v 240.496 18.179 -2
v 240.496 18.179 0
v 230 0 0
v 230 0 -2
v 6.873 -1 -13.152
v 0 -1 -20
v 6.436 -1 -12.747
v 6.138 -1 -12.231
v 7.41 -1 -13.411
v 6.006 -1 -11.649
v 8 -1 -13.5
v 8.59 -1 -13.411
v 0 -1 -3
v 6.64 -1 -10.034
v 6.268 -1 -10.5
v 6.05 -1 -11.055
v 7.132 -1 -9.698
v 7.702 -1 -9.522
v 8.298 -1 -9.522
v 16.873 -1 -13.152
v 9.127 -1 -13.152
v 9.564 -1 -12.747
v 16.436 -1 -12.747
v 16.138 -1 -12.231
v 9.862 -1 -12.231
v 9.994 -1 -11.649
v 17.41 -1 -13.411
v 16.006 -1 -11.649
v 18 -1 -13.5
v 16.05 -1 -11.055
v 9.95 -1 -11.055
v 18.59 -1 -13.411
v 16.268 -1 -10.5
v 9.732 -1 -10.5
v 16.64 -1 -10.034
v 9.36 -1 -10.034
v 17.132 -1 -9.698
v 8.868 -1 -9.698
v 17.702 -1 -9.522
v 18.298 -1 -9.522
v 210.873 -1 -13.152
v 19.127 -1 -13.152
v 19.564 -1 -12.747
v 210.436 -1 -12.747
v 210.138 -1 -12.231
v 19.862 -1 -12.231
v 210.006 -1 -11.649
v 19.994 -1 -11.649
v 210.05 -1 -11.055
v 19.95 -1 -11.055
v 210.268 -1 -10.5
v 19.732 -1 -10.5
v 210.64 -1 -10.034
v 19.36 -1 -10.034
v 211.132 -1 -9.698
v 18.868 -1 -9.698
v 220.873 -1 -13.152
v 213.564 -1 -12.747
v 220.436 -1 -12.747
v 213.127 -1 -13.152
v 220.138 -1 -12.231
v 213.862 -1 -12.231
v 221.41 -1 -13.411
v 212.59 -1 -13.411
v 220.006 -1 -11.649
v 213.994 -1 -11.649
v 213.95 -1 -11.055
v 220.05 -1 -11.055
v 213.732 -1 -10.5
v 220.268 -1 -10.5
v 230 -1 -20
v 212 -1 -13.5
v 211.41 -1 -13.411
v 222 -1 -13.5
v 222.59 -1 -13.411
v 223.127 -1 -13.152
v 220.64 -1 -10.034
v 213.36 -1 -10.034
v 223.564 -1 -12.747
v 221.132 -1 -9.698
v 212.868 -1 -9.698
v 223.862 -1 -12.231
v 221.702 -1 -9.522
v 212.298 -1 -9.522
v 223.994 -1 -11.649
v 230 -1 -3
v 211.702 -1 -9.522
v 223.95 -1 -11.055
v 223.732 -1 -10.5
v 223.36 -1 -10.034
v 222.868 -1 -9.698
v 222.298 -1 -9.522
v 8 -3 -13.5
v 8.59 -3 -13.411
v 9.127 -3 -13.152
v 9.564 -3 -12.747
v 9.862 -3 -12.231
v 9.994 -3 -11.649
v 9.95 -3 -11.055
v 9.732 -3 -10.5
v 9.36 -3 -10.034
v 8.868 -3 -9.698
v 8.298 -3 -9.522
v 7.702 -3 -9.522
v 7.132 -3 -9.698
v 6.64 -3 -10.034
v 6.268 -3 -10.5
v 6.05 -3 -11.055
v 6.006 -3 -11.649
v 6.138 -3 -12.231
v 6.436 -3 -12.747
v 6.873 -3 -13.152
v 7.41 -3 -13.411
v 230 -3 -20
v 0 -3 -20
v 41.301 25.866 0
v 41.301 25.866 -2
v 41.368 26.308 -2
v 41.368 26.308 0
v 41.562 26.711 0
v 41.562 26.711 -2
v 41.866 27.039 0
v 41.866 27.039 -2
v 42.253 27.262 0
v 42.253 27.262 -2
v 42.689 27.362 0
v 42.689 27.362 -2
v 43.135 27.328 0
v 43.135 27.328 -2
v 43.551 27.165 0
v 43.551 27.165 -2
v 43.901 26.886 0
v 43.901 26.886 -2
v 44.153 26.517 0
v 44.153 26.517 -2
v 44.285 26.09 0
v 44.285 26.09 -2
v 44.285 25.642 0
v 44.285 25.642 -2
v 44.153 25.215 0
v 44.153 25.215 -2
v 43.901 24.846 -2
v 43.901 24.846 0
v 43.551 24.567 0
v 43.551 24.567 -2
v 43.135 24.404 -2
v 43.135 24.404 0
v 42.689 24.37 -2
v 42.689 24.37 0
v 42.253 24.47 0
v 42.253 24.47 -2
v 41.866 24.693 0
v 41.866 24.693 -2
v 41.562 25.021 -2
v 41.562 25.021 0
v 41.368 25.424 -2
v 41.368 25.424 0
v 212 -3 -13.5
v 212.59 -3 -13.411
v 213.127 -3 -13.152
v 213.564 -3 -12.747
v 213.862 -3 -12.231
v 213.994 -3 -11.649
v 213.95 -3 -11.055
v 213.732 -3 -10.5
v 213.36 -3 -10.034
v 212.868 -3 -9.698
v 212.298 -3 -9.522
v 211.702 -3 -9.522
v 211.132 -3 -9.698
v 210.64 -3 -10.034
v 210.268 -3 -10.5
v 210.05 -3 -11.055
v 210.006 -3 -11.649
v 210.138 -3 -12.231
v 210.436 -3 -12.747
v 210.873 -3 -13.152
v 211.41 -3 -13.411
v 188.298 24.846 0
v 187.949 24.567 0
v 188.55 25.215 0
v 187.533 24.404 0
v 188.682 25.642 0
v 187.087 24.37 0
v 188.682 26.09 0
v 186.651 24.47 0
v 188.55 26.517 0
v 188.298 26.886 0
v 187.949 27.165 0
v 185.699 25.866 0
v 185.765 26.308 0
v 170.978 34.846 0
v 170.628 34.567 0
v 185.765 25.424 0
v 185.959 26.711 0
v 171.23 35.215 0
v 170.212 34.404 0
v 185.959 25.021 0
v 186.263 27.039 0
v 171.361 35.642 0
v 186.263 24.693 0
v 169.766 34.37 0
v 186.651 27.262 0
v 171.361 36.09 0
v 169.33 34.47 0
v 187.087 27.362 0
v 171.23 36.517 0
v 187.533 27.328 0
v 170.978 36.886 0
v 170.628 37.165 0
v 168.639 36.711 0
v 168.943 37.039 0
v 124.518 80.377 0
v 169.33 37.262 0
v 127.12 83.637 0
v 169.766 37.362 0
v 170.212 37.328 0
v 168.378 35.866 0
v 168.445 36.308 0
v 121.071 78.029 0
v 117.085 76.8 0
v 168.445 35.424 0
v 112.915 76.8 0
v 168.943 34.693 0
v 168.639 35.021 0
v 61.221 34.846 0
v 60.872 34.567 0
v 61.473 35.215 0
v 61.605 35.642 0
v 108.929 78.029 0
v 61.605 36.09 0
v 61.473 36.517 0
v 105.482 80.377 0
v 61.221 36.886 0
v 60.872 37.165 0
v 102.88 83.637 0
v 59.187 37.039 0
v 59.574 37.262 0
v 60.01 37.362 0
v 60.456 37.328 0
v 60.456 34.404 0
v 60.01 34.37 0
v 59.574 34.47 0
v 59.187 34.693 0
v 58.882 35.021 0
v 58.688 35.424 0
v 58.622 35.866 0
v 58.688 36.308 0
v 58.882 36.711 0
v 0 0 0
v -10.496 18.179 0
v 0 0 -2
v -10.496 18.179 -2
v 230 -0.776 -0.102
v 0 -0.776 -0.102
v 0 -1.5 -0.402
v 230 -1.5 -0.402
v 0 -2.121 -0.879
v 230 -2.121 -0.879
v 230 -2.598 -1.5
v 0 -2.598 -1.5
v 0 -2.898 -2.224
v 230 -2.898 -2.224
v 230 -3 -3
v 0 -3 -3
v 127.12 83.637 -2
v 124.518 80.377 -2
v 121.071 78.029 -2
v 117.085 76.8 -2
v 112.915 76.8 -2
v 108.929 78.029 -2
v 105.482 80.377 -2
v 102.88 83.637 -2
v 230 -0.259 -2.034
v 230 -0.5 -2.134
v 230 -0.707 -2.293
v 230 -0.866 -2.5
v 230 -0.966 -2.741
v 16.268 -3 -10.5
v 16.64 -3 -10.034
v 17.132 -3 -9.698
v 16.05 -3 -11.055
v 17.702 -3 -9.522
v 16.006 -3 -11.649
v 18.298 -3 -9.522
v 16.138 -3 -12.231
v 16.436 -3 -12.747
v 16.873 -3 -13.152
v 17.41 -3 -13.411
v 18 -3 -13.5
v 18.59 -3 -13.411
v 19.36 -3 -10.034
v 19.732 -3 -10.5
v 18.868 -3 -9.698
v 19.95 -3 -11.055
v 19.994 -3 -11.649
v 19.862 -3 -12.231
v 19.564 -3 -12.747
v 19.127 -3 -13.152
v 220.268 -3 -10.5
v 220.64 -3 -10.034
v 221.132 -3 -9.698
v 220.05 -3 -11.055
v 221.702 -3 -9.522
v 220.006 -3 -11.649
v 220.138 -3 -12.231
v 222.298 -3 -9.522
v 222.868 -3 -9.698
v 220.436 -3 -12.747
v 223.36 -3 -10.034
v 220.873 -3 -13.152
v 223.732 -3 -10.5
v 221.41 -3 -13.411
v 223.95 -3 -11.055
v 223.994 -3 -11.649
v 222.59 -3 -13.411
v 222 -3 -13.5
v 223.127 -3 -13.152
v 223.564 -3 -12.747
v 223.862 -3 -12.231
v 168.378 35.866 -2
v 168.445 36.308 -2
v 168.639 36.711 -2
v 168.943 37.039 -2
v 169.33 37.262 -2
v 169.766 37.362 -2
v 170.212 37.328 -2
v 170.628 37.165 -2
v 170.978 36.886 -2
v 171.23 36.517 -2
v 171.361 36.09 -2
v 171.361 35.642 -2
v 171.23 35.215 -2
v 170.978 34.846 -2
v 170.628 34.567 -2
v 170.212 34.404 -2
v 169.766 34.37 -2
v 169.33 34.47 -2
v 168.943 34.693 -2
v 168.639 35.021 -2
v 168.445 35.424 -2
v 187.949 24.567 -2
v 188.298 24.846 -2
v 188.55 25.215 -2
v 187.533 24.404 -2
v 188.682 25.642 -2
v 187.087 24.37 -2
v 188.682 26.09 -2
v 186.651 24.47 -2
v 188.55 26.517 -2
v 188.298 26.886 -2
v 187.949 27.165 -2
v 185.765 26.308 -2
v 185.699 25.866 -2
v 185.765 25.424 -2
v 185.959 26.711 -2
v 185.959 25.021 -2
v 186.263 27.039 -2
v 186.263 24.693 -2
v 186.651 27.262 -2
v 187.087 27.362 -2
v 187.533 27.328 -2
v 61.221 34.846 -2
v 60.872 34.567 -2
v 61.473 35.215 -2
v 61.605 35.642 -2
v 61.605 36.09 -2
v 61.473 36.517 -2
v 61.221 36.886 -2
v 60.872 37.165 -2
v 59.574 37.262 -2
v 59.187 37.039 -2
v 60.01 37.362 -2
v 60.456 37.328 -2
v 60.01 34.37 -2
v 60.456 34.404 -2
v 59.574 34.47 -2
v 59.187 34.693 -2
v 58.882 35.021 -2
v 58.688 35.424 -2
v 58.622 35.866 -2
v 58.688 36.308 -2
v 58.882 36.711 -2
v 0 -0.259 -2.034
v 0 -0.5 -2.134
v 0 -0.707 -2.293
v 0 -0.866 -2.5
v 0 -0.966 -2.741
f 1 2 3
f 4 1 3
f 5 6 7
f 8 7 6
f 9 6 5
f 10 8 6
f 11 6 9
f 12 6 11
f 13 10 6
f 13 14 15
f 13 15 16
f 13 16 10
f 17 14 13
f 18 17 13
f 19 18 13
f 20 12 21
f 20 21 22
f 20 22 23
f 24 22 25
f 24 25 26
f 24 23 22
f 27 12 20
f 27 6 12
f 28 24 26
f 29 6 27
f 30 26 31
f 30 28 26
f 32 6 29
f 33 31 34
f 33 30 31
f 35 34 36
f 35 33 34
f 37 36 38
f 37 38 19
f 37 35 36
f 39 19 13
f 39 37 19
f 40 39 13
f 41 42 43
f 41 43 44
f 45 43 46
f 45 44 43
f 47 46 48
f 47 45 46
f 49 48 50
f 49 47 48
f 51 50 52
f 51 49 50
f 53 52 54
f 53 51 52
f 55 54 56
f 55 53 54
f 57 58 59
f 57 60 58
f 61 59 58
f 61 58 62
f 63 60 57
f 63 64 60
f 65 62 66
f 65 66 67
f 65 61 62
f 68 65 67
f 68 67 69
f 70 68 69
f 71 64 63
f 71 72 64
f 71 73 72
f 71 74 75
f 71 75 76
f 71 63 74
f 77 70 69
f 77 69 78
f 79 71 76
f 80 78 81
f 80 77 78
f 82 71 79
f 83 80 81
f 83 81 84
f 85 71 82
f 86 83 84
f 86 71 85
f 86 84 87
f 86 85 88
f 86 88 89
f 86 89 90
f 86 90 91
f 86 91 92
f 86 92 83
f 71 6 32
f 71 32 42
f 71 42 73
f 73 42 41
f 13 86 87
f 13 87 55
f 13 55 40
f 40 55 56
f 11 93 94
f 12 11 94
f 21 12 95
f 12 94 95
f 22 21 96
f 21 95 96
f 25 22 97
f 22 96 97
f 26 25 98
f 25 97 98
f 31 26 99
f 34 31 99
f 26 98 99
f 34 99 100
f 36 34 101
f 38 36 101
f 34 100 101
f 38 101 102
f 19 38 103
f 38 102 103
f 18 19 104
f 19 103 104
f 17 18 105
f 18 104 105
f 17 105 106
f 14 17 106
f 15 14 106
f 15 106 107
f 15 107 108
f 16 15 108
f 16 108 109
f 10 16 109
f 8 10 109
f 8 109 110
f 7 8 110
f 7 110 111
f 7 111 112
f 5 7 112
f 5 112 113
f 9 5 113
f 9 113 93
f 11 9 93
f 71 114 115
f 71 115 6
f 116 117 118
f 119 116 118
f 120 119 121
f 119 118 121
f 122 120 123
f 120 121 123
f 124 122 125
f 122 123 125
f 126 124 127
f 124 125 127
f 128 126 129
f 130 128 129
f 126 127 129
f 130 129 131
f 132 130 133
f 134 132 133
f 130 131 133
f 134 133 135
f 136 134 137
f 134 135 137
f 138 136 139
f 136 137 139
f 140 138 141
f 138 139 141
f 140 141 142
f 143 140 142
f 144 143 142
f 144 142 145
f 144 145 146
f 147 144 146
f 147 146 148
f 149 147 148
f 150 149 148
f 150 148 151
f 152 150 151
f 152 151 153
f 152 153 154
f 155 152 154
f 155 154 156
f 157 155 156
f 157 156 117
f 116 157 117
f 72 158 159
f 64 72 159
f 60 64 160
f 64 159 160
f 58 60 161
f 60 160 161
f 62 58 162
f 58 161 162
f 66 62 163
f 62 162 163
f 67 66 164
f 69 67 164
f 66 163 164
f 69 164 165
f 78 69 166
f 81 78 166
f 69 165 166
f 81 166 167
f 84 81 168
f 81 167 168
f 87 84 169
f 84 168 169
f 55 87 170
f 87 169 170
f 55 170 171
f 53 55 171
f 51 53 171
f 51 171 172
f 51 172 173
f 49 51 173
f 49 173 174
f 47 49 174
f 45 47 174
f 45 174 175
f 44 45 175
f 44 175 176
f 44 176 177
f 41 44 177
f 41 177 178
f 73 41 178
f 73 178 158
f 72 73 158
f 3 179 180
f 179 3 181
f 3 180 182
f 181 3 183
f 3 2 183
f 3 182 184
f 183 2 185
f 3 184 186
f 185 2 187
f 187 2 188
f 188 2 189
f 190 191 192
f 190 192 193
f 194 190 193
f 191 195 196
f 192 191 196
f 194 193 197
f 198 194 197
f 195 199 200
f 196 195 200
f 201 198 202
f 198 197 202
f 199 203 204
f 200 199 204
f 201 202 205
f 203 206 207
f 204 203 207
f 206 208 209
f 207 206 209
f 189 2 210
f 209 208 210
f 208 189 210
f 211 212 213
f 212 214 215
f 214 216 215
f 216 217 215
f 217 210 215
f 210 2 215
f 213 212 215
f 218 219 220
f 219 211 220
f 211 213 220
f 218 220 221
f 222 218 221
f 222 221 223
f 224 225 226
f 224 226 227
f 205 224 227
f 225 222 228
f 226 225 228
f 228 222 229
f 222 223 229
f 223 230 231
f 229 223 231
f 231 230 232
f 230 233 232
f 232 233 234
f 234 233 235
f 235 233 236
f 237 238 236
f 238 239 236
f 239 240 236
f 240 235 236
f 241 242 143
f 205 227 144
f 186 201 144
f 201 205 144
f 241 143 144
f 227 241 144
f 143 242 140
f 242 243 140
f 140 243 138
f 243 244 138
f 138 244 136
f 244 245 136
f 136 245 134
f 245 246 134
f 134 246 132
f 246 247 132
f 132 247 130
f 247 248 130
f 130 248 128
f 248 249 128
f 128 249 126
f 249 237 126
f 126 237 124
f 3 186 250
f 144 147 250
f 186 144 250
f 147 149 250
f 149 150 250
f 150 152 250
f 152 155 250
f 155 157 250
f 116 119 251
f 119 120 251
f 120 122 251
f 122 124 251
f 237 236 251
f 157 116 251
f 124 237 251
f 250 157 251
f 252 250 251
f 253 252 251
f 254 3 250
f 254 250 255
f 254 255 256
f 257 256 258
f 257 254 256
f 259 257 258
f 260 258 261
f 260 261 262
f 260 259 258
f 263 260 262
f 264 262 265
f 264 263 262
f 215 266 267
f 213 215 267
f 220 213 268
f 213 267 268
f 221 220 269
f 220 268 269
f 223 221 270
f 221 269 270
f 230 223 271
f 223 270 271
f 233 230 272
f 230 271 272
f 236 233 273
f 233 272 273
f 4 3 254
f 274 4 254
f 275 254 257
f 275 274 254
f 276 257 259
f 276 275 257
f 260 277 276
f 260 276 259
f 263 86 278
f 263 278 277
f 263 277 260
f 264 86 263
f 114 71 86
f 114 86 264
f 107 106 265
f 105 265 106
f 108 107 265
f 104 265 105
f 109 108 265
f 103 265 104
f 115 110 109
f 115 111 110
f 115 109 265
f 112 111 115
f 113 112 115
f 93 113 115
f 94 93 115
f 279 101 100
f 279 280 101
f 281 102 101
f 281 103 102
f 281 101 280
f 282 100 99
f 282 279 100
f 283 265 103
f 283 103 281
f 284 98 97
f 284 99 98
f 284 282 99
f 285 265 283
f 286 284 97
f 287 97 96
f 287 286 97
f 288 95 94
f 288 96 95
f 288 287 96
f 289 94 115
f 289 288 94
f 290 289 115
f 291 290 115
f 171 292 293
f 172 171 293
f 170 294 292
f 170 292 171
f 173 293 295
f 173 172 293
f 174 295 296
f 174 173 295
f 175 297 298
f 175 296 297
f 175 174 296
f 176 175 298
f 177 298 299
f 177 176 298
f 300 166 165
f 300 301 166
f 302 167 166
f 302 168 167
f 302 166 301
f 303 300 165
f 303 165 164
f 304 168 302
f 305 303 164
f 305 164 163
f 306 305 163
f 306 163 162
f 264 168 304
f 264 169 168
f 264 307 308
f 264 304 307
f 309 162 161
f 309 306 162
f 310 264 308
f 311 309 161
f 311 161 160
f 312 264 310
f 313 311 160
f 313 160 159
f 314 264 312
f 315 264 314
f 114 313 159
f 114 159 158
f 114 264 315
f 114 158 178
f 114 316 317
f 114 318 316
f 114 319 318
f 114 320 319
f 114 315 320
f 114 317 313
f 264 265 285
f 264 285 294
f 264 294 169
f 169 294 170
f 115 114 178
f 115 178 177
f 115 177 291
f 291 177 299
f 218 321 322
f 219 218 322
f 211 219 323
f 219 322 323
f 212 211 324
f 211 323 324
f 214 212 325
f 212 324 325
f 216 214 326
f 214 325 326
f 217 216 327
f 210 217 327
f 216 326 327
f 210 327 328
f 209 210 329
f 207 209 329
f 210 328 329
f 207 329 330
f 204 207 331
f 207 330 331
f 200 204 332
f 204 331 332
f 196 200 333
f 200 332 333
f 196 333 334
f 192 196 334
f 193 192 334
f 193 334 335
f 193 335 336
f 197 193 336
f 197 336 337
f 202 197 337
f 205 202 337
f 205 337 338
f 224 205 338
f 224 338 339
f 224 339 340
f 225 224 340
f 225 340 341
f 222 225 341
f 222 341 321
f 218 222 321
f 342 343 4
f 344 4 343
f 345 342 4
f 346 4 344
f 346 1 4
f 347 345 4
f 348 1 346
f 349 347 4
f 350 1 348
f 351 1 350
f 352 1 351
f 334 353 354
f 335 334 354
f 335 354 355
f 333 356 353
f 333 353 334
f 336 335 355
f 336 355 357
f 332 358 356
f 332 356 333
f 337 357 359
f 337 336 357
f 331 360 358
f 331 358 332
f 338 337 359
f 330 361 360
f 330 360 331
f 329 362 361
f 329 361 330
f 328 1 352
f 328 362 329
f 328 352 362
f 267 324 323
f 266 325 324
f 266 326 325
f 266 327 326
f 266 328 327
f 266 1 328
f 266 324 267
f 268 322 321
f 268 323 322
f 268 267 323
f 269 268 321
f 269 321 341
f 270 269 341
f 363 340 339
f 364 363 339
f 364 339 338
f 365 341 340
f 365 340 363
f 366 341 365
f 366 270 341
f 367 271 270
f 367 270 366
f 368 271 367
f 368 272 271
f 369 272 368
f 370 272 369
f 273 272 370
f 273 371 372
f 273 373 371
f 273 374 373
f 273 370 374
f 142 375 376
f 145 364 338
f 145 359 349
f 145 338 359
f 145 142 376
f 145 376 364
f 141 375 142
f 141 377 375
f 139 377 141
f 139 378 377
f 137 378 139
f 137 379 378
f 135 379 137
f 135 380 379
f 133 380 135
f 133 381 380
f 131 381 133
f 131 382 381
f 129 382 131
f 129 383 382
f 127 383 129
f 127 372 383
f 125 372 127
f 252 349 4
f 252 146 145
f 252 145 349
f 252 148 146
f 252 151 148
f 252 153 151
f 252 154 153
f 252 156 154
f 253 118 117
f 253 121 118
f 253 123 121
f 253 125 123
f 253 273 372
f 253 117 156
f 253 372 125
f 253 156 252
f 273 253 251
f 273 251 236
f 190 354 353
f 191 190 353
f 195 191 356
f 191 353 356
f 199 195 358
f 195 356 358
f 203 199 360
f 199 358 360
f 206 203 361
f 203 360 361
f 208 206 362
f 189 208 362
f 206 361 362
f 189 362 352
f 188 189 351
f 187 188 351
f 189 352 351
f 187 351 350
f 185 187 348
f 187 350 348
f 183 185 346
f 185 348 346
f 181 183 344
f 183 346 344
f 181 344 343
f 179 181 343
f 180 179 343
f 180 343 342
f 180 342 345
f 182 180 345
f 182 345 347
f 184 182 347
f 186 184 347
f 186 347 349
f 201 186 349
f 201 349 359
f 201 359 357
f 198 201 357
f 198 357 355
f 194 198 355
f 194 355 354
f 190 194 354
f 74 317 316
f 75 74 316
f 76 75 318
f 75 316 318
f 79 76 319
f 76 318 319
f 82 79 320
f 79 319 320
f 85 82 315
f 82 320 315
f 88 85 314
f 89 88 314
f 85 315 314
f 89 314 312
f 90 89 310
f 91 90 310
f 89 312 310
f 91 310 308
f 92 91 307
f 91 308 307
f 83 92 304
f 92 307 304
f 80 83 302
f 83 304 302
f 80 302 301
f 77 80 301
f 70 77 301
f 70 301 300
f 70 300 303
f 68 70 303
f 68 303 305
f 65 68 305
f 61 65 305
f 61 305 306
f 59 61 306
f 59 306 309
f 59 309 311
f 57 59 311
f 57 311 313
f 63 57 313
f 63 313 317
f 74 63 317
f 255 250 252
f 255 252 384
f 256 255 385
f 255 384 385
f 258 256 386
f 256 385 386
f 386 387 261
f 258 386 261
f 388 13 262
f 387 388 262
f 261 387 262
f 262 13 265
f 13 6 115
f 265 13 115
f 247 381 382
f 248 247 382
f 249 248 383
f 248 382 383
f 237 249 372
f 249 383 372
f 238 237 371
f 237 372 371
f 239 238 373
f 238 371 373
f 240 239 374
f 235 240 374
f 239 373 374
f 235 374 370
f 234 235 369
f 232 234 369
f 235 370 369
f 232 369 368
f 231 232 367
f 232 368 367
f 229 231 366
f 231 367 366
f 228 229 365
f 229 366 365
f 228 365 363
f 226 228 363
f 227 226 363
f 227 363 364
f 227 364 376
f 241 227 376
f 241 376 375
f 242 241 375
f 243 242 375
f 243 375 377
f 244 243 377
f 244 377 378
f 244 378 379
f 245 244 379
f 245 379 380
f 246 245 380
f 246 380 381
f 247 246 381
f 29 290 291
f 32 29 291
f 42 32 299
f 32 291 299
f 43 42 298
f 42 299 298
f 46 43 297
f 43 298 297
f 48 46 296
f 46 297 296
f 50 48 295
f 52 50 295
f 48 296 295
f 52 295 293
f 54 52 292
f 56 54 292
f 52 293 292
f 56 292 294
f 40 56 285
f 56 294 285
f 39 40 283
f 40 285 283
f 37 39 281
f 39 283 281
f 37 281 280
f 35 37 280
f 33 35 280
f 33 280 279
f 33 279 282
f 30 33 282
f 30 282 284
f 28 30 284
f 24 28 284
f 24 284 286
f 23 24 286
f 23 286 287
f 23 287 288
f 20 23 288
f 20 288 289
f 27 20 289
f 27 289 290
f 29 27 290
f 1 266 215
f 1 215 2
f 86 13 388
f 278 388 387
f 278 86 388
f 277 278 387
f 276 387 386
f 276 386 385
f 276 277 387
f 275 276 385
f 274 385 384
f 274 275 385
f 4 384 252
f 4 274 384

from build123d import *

# Parameters (mm, degrees)
SKETCH_10_R                   = 10
SM_BASE_FLANGE_3_DEPTH        = 2
SM_EDGE_FLANGE_6_DEPTH        = 230
SM_EDGE_FLANGE_6_BEND_DEPTH   = 230
SM_EDGE_FLANGE_6_BEND_2_DEPTH = 230
CUT_EXTRUDE_4_REACH           = 363.137
SKETCH_47_R                   = 2
CUT_EXTRUDE_6_REACH           = 263.424
SKETCH_50_R                   = 2
CUT_EXTRUDE_7_REACH           = 351.772
SKETCH_51_R                   = 2
CUT_EXTRUDE_8_REACH           = 349.61
SKETCH_52_R                   = 14
SKETCH_53_R                   = 1.5
CUT_EXTRUDE_9_DEPTH           = 10
OTHER_START                   = -20
OTHER_1_OUTLINE_R             = 1.5
OTHER_1_OUTLINE_R_2           = 10
OTHER_1_DEPTH                 = 20


# Read off the part's stored shape, not the designer's step: Полость1
# Sheet-metal steps are written as plain solids
with BuildPart() as part:
    # Эскиз10 → Базовая кромка3 (new body)
    with BuildSketch(Plane.XY):
        Polygon((0, 0), (-21, 36.373066959), (94, 235.558909829), (136, 235.558909829), (251, 36.373066959), (230, 0), align=None)
        with Locations((171.849364905, 123.465988394)):
            Circle(SKETCH_10_R, mode=Mode.SUBTRACT)
    extrude(amount=-SM_BASE_FLANGE_3_DEPTH)

    # Ребро-кромка6 section (across the edge) → Ребро-кромка6 (add)
    with BuildSketch(Plane(origin=(-21.866025404, 36.873066959, -2), x_dir=(0.8660254037844436, -0.4999999999999914, -3.4914813388431334e-15), z_dir=(0.4999999999999914, 0.8660254037844436, 0))):
        with BuildLine():
            Line((-2, 1), (-2, 18))
            Line((-2, 18), (0, 18))
            Line((0, 18), (0, 1))
            ThreePointArc((0, 1), (0.292893219, 0.292893219), (1, 0))
            Line((1, 0), (1, -2))
            ThreePointArc((1, -2), (-1.121320344, -1.121320344), (-2, 1))
        make_face()
    extrude(amount=SM_EDGE_FLANGE_6_DEPTH)

    # Ребро-кромка6 section 2 (across the edge) → Ребро-кромка6 bend (add)
    with BuildSketch(Plane(origin=(136.866025404, 236.058909829, -2), x_dir=(-0.8660254037844363, -0.5000000000000041, -3.4914813388431334e-15), z_dir=(0.5000000000000041, -0.8660254037844363, 0))):
        with BuildLine():
            Line((-2, 1), (-2, 18))
            Line((-2, 18), (0, 18))
            Line((0, 18), (0, 1))
            ThreePointArc((0, 1), (0.292893219, 0.292893219), (1, 0))
            Line((1, 0), (1, -2))
            ThreePointArc((1, -2), (-1.121320344, -1.121320344), (-2, 1))
        make_face()
    extrude(amount=SM_EDGE_FLANGE_6_BEND_DEPTH)

    # Ребро-кромка6 section 3 (across the edge) → Ребро-кромка6 bend 2 (add)
    with BuildSketch(Plane(origin=(230, -1, -2), x_dir=(0, 1, 0), z_dir=(-1, 0, 0))):
        with BuildLine():
            Line((-2, 1), (-2, 18))
            Line((-2, 18), (0, 18))
            Line((0, 18), (0, 1))
            ThreePointArc((0, 1), (0.292893219, 0.292893219), (1, 0))
            Line((1, 0), (1, -2))
            ThreePointArc((1, -2), (-1.121320344, -1.121320344), (-2, 1))
        make_face()
    extrude(amount=SM_EDGE_FLANGE_6_BEND_2_DEPTH)

    # Эскиз47 → Вырез-Вытянуть4 (cut, up to next)
    with BuildSketch(Plane(origin=(-34.098076211, 19.686533479, 0), x_dir=(0, 0, 1), z_dir=(-0.866025403784443, 0.4999999999999925, 3.788649256556814e-15)), mode=Mode.PRIVATE) as cut_extrude_4_sk1:
        with Locations(Location((-11.5, 29, 0), (0, 0, 270))):
            Circle(SKETCH_47_R)
    cut_extrude_4_tool1 = extrude(cut_extrude_4_sk1.sketch, amount=-CUT_EXTRUDE_4_REACH, mode=Mode.PRIVATE) & part.part
    # Эскиз47 → Вырез-Вытянуть4 (cut, up to next)
    with BuildSketch(Plane(origin=(-34.098076211, 19.686533479, 0), x_dir=(0, 0, 1), z_dir=(-0.866025403784443, 0.4999999999999925, 3.788649256556814e-15)), mode=Mode.PRIVATE) as cut_extrude_4_sk2:
        with Locations(Location((-11.5, 39, 0), (0, 0, 270))):
            Circle(SKETCH_47_R)
    cut_extrude_4_tool2 = extrude(cut_extrude_4_sk2.sketch, amount=-CUT_EXTRUDE_4_REACH, mode=Mode.PRIVATE) & part.part
    # Эскиз47 → Вырез-Вытянуть4 (cut, up to next)
    with BuildSketch(Plane(origin=(-34.098076211, 19.686533479, 0), x_dir=(0, 0, 1), z_dir=(-0.866025403784443, 0.4999999999999925, 3.788649256556814e-15)), mode=Mode.PRIVATE) as cut_extrude_4_sk3:
        with Locations(Location((-11.5, 233, 0), (0, 0, 270))):
            Circle(SKETCH_47_R)
    cut_extrude_4_tool3 = extrude(cut_extrude_4_sk3.sketch, amount=-CUT_EXTRUDE_4_REACH, mode=Mode.PRIVATE) & part.part
    # Эскиз47 → Вырез-Вытянуть4 (cut, up to next)
    with BuildSketch(Plane(origin=(-34.098076211, 19.686533479, 0), x_dir=(0, 0, 1), z_dir=(-0.866025403784443, 0.4999999999999925, 3.788649256556814e-15)), mode=Mode.PRIVATE) as cut_extrude_4_sk4:
        with Locations(Location((-11.5, 243, 0), (0, 0, 270))):
            Circle(SKETCH_47_R)
    cut_extrude_4_tool4 = extrude(cut_extrude_4_sk4.sketch, amount=-CUT_EXTRUDE_4_REACH, mode=Mode.PRIVATE) & part.part
    add(cut_extrude_4_tool1.solids().sort_by_distance((-19.598076, 44.80127, -11.5))[0], mode=Mode.SUBTRACT)
    add(cut_extrude_4_tool2.solids().sort_by_distance((-14.598076, 53.461524, -11.5))[0], mode=Mode.SUBTRACT)
    add(cut_extrude_4_tool3.solids().sort_by_distance((82.401924, 221.470453, -11.5))[0], mode=Mode.SUBTRACT)
    add(cut_extrude_4_tool4.solids().sort_by_distance((87.401924, 230.130707, -11.5))[0], mode=Mode.SUBTRACT)

    # Эскиз50 → Вырез-Вытянуть6 (cut, up to next)
    with BuildSketch(Plane(origin=(206.598076211, 119.279454915, 0), x_dir=(0, 0, -1), z_dir=(0.866025403784436, 0.5000000000000047, 3.0623287353932815e-15)), mode=Mode.PRIVATE) as cut_extrude_6_sk1:
        with Locations(Location((11.5, -86, 0), (0, 0, 90))):
            Circle(SKETCH_50_R)
    cut_extrude_6_tool1 = extrude(cut_extrude_6_sk1.sketch, amount=-CUT_EXTRUDE_6_REACH, mode=Mode.PRIVATE) & part.part
    # Эскиз50 → Вырез-Вытянуть6 (cut, up to next)
    with BuildSketch(Plane(origin=(206.598076211, 119.279454915, 0), x_dir=(0, 0, -1), z_dir=(0.866025403784436, 0.5000000000000047, 3.0623287353932815e-15)), mode=Mode.PRIVATE) as cut_extrude_6_sk2:
        with Locations(Location((11.5, -76, 0), (0, 0, 90))):
            Circle(SKETCH_50_R)
    cut_extrude_6_tool2 = extrude(cut_extrude_6_sk2.sketch, amount=-CUT_EXTRUDE_6_REACH, mode=Mode.PRIVATE) & part.part
    # Эскиз50 → Вырез-Вытянуть6 (cut, up to next)
    with BuildSketch(Plane(origin=(206.598076211, 119.279454915, 0), x_dir=(0, 0, -1), z_dir=(0.866025403784436, 0.5000000000000047, 3.0623287353932815e-15)), mode=Mode.PRIVATE) as cut_extrude_6_sk3:
        with Locations(Location((11.5, 118, 0), (0, 0, 90))):
            Circle(SKETCH_50_R)
    cut_extrude_6_tool3 = extrude(cut_extrude_6_sk3.sketch, amount=-CUT_EXTRUDE_6_REACH, mode=Mode.PRIVATE) & part.part
    # Эскиз50 → Вырез-Вытянуть6 (cut, up to next)
    with BuildSketch(Plane(origin=(206.598076211, 119.279454915, 0), x_dir=(0, 0, -1), z_dir=(0.866025403784436, 0.5000000000000047, 3.0623287353932815e-15)), mode=Mode.PRIVATE) as cut_extrude_6_sk4:
        with Locations(Location((11.5, 128, 0), (0, 0, 90))):
            Circle(SKETCH_50_R)
    cut_extrude_6_tool4 = extrude(cut_extrude_6_sk4.sketch, amount=-CUT_EXTRUDE_6_REACH, mode=Mode.PRIVATE) & part.part
    add(cut_extrude_6_tool1.solids().sort_by_distance((249.598076, 44.80127, -11.5))[0], mode=Mode.SUBTRACT)
    add(cut_extrude_6_tool2.solids().sort_by_distance((244.598076, 53.461524, -11.5))[0], mode=Mode.SUBTRACT)
    add(cut_extrude_6_tool3.solids().sort_by_distance((147.598076, 221.470453, -11.5))[0], mode=Mode.SUBTRACT)
    add(cut_extrude_6_tool4.solids().sort_by_distance((142.598076, 230.130707, -11.5))[0], mode=Mode.SUBTRACT)

    # Эскиз51 → Вырез-Вытянуть7 (cut, up to next)
    with BuildSketch(Plane.XZ.offset(3), mode=Mode.PRIVATE) as cut_extrude_7_sk1:
        with Locations(Location((222, -11.5, 0), (0, 0, 270))):
            Circle(SKETCH_51_R)
    cut_extrude_7_tool1 = extrude(cut_extrude_7_sk1.sketch, amount=-CUT_EXTRUDE_7_REACH, mode=Mode.PRIVATE) & part.part
    # Эскиз51 → Вырез-Вытянуть7 (cut, up to next)
    with BuildSketch(Plane.XZ.offset(3), mode=Mode.PRIVATE) as cut_extrude_7_sk2:
        with Locations(Location((212, -11.5, 0), (0, 0, 270))):
            Circle(SKETCH_51_R)
    cut_extrude_7_tool2 = extrude(cut_extrude_7_sk2.sketch, amount=-CUT_EXTRUDE_7_REACH, mode=Mode.PRIVATE) & part.part
    # Эскиз51 → Вырез-Вытянуть7 (cut, up to next)
    with BuildSketch(Plane.XZ.offset(3), mode=Mode.PRIVATE) as cut_extrude_7_sk3:
        with Locations(Location((18, -11.5, 0), (0, 0, 270))):
            Circle(SKETCH_51_R)
    cut_extrude_7_tool3 = extrude(cut_extrude_7_sk3.sketch, amount=-CUT_EXTRUDE_7_REACH, mode=Mode.PRIVATE) & part.part
    # Эскиз51 → Вырез-Вытянуть7 (cut, up to next)
    with BuildSketch(Plane.XZ.offset(3), mode=Mode.PRIVATE) as cut_extrude_7_sk4:
        with Locations(Location((8, -11.5, 0), (0, 0, 270))):
            Circle(SKETCH_51_R)
    cut_extrude_7_tool4 = extrude(cut_extrude_7_sk4.sketch, amount=-CUT_EXTRUDE_7_REACH, mode=Mode.PRIVATE) & part.part
    add(cut_extrude_7_tool1.solids().sort_by_distance((222, -3, -11.5))[0], mode=Mode.SUBTRACT)
    add(cut_extrude_7_tool2.solids().sort_by_distance((212, -3, -11.5))[0], mode=Mode.SUBTRACT)
    add(cut_extrude_7_tool3.solids().sort_by_distance((18, -3, -11.5))[0], mode=Mode.SUBTRACT)
    add(cut_extrude_7_tool4.solids().sort_by_distance((8, -3, -11.5))[0], mode=Mode.SUBTRACT)

    # Эскиз52 → Вырез-Вытянуть8 (cut, up to next)
    with BuildSketch(Plane(origin=(0, 0, -2), x_dir=(-1, 0, 0), z_dir=(0, 0, -1)), mode=Mode.PRIVATE) as cut_extrude_8_sk1:
        with Locations((-115, 90.643992263)):
            Circle(SKETCH_52_R)
    cut_extrude_8_tool1 = extrude(cut_extrude_8_sk1.sketch, amount=-CUT_EXTRUDE_8_REACH, mode=Mode.PRIVATE) & part.part
    add(cut_extrude_8_tool1.solids().sort_by_distance((115, 90.643992, -2))[0], mode=Mode.SUBTRACT)

    # Эскиз53 → Вырез-Вытянуть9 (cut)
    with BuildSketch(Plane(origin=(0, 0, -2), x_dir=(-1, 0, 0), z_dir=(0, 0, -1))):
        with Locations((-40.121778265, 70.507041555)):
            Circle(SKETCH_53_R)
        with Locations((-22.801270189, 60.507041555)):
            Circle(SKETCH_53_R)
        with Locations((-60.121778265, 35.866025404)):
            Circle(SKETCH_53_R)
        with Locations((-42.801270189, 25.866025404)):
            Circle(SKETCH_53_R)
        with Locations((-95, 185.558909829)):
            Circle(SKETCH_53_R)
        with Locations((-95, 165.558909829)):
            Circle(SKETCH_53_R)
        with Locations((-135, 185.558909829)):
            Circle(SKETCH_53_R)
        with Locations((-135, 165.558909829)):
            Circle(SKETCH_53_R)
        with Locations((-207.198729811, 60.507041555)):
            Circle(SKETCH_53_R)
        with Locations((-189.878221735, 70.507041555)):
            Circle(SKETCH_53_R)
        with Locations((-187.198729811, 25.866025404)):
            Circle(SKETCH_53_R)
        with Locations((-169.878221735, 35.866025404)):
            Circle(SKETCH_53_R)
    extrude(amount=-CUT_EXTRUDE_9_DEPTH, mode=Mode.SUBTRACT)

    # Полость1 outline → Полость1 (cut)
    with BuildSketch(Plane.XY.offset(OTHER_START)):
        with BuildLine():
            Line((127.120094671, 83.636617208), (240.495741262, 18.17915713))
            Line((240.495741262, 18.17915713), (251, 36.373066959))
            Line((251, 36.373066959), (253.598076211, 37.873066959))
            Line((253.598076211, 37.873066959), (138.598076211, 237.058909829))
            Line((138.598076211, 237.058909829), (136, 235.558909829))
            Line((136, 235.558909829), (94, 235.558909829))
            Line((94, 235.558909829), (91.401923789, 237.058909829))
            Line((91.401923789, 237.058909829), (-23.598076211, 37.873066959))
            Line((-23.598076211, 37.873066959), (-21, 36.373066959))
            Line((-21, 36.373066959), (-10.495741262, 18.17915713))
            Line((-10.495741262, 18.17915713), (102.879905329, 83.636617208))
            ThreePointArc((102.879905329, 83.636617208), (115, 104.643992263), (127.120094671, 83.636617208))
        make_face()
        with Locations((22.801270189, 60.507041555)):
            Circle(OTHER_1_OUTLINE_R, mode=Mode.SUBTRACT)
        with Locations((40.121778265, 70.507041555)):
            Circle(OTHER_1_OUTLINE_R, mode=Mode.SUBTRACT)
        with Locations((189.878221735, 70.507041555)):
            Circle(OTHER_1_OUTLINE_R, mode=Mode.SUBTRACT)
        with Locations((207.198729811, 60.507041555)):
            Circle(OTHER_1_OUTLINE_R, mode=Mode.SUBTRACT)
        with Locations((171.849364905, 123.465988394)):
            Circle(OTHER_1_OUTLINE_R_2, mode=Mode.SUBTRACT)
        with Locations((95, 165.558909829)):
            Circle(OTHER_1_OUTLINE_R, mode=Mode.SUBTRACT)
        with Locations((95, 185.558909829)):
            Circle(OTHER_1_OUTLINE_R, mode=Mode.SUBTRACT)
        with Locations((135, 165.558909829)):
            Circle(OTHER_1_OUTLINE_R, mode=Mode.SUBTRACT)
        with Locations((135, 185.558909829)):
            Circle(OTHER_1_OUTLINE_R, mode=Mode.SUBTRACT)
    extrude(amount=OTHER_1_DEPTH, mode=Mode.SUBTRACT)


solid = part.part
